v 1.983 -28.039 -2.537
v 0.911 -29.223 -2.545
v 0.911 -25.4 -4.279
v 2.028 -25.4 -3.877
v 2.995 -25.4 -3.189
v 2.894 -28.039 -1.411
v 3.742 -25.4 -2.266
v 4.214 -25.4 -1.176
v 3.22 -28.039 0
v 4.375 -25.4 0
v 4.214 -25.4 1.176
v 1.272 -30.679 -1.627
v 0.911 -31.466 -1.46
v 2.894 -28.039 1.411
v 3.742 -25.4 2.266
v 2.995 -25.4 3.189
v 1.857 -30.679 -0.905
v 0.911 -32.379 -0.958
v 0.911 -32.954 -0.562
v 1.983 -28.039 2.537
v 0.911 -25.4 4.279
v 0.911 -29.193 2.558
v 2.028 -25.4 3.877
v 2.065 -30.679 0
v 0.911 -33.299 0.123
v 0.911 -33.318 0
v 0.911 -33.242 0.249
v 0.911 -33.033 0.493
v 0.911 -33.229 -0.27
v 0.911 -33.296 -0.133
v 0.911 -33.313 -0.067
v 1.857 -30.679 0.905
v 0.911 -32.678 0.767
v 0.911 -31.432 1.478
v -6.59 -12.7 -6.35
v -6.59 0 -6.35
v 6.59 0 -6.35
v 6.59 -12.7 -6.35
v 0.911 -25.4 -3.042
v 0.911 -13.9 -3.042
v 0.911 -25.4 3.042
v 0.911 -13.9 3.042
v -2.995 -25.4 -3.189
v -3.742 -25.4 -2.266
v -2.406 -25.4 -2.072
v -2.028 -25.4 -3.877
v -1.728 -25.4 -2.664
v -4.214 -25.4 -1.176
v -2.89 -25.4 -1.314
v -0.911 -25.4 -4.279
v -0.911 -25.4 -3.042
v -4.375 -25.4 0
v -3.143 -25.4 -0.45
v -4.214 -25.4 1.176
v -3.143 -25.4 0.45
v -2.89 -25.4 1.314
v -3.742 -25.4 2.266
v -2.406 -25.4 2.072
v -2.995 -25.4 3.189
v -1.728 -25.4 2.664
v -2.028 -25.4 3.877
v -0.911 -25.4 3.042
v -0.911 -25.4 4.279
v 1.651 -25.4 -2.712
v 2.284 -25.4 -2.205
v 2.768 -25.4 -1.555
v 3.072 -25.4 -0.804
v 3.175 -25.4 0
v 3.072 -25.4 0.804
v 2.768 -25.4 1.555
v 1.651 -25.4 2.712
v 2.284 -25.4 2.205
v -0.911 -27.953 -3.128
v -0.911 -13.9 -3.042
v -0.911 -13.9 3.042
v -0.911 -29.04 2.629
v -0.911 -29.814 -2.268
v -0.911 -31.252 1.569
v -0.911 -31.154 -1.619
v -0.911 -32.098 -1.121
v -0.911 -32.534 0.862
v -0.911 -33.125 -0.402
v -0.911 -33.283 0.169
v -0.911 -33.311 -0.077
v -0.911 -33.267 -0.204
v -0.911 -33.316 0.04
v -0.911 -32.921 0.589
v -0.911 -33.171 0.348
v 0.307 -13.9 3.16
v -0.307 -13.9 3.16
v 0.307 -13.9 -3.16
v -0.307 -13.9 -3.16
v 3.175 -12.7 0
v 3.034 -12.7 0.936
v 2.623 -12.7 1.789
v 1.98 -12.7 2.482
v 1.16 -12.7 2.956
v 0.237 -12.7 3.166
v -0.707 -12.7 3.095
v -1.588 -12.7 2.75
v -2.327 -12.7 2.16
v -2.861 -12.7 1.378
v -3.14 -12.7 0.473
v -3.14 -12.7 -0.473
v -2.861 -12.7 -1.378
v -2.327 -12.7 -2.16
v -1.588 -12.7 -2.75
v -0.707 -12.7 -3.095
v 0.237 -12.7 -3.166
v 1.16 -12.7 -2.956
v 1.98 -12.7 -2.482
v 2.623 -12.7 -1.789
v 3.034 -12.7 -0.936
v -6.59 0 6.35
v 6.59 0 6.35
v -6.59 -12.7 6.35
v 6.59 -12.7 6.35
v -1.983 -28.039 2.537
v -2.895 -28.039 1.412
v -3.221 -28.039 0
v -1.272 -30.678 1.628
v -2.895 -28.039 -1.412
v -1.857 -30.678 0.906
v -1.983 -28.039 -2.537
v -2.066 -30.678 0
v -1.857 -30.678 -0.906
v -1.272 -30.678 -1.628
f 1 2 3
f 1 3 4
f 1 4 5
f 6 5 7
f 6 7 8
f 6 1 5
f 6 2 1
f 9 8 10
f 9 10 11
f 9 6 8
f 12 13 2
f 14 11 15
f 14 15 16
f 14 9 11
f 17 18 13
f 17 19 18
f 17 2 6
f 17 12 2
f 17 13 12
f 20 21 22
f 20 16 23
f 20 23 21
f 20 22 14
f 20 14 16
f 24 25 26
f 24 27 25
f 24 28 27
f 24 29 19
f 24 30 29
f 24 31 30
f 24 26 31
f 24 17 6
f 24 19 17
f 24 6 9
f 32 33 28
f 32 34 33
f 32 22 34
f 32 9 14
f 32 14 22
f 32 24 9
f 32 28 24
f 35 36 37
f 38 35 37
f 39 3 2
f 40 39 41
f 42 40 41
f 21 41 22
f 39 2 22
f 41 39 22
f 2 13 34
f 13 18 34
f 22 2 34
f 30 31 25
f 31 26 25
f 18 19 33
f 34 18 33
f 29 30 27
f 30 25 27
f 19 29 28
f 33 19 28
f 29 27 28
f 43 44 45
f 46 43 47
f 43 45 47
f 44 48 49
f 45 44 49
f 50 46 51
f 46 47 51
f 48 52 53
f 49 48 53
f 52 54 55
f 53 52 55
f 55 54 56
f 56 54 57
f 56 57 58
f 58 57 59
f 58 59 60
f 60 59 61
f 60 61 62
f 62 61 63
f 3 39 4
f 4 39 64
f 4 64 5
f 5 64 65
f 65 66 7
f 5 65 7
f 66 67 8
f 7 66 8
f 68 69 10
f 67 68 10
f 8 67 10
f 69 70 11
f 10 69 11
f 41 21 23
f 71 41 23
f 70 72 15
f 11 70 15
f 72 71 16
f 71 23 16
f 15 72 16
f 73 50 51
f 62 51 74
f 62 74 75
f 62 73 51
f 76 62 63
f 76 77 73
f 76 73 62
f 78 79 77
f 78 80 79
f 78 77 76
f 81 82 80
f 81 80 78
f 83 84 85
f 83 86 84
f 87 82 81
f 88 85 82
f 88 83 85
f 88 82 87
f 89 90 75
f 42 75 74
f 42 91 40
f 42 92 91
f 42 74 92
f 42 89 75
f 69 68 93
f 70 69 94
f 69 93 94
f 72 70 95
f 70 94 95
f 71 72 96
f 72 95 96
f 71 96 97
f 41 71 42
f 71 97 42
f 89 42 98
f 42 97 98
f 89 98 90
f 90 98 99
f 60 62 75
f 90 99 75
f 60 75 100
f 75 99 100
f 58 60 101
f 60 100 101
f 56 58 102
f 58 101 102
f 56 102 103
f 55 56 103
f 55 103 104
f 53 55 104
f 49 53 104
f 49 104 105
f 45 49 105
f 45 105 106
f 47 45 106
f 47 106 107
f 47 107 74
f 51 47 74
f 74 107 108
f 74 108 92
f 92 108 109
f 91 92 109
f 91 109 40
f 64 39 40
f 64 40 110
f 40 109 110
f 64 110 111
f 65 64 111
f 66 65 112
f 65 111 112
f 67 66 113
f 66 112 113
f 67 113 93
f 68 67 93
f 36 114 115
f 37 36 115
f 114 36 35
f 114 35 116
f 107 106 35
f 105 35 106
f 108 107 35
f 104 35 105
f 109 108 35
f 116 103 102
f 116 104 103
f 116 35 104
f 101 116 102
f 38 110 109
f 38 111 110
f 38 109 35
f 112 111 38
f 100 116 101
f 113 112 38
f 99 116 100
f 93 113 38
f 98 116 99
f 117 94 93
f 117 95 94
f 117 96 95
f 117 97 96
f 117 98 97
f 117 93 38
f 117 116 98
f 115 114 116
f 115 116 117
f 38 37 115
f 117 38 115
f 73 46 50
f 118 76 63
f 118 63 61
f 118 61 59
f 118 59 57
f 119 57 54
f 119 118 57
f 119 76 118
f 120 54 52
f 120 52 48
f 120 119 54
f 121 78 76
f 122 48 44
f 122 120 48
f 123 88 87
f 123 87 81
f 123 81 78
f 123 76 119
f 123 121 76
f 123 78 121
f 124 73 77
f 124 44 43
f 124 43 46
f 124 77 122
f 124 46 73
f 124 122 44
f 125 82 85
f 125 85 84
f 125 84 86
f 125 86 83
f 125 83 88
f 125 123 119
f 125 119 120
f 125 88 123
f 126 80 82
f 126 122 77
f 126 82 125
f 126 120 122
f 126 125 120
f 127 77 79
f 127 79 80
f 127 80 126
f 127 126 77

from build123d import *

# Parameters (mm, degrees)
F0_W      = 13.1792449958
F0_H      = 12.7
F1_DEPTH  = 12.7
F2_R      = 3.175
F3_DEPTH  = 12.7
F7_R      = 4.375
F9_W      = 1.821417918
F9_H      = 11
F10_DEPTH = 21.5


with BuildPart() as f1:
    # F0 (on Front) → F1 (new body)
    with BuildSketch(Plane.XZ):
        Rectangle(F0_W, F0_H)
    extrude(amount=F1_DEPTH)

    # F2 (on face) → F3 (join)
    with BuildSketch(Plane.XZ.offset(12.7)):
        Circle(F2_R)
    extrude(amount=F3_DEPTH)

    # F7 (on offset) → F8 section 0
    with BuildSketch(Plane.XZ.offset(25.4), mode=Mode.PRIVATE) as f8_s0:
        Circle(F7_R)
    loft([f8_s0.sketch, Vertex(0, -35.4, 0)])

    # F9 (on offset) → F10 (cut)
    with BuildSketch(Plane.XZ.offset(35.4)):
        Rectangle(F9_W, F9_H)
    extrude(amount=-F10_DEPTH, mode=Mode.SUBTRACT)


solid = f1.part
